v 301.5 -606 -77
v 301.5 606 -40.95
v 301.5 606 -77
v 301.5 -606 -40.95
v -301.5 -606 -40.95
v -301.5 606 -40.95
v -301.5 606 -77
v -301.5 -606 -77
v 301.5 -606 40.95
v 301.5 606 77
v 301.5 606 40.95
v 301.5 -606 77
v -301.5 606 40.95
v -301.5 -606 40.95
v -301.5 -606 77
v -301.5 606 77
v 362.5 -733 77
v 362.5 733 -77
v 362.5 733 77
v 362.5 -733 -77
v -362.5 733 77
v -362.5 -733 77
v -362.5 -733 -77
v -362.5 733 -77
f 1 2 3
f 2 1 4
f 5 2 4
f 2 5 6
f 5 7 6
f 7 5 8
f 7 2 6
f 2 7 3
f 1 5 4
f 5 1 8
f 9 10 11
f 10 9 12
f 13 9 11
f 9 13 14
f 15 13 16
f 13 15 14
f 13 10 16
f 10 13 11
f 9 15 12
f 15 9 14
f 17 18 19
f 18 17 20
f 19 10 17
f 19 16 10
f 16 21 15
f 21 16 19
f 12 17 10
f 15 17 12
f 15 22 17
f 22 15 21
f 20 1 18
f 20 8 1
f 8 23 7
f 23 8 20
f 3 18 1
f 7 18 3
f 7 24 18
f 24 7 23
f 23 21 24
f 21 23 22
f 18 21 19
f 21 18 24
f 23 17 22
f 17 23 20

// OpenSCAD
// Box dimensions
box_width = 725;
box_depth = 1466;
box_height = 154;

// Recess parameters
recess_depth = 36;
bezel_width_x = 61;
bezel_width_y = 127;

// Calculated recess dimensions
recess_width = box_width - (2 * bezel_width_x);
recess_depth_y = box_depth - (2 * bezel_width_y);

difference() {
    // Main box
    cube([box_width, box_depth, box_height], center=true);
    
    // Recess cutouts on top and bottom using a loop
    for (z_pos = [-(box_height - recess_depth) / 2, (box_height - recess_depth) / 2]) {
        translate([0, 0, z_pos]) {
            cube([recess_width, recess_depth_y, recess_depth + 0.1], center=true);
        }
    }
}
